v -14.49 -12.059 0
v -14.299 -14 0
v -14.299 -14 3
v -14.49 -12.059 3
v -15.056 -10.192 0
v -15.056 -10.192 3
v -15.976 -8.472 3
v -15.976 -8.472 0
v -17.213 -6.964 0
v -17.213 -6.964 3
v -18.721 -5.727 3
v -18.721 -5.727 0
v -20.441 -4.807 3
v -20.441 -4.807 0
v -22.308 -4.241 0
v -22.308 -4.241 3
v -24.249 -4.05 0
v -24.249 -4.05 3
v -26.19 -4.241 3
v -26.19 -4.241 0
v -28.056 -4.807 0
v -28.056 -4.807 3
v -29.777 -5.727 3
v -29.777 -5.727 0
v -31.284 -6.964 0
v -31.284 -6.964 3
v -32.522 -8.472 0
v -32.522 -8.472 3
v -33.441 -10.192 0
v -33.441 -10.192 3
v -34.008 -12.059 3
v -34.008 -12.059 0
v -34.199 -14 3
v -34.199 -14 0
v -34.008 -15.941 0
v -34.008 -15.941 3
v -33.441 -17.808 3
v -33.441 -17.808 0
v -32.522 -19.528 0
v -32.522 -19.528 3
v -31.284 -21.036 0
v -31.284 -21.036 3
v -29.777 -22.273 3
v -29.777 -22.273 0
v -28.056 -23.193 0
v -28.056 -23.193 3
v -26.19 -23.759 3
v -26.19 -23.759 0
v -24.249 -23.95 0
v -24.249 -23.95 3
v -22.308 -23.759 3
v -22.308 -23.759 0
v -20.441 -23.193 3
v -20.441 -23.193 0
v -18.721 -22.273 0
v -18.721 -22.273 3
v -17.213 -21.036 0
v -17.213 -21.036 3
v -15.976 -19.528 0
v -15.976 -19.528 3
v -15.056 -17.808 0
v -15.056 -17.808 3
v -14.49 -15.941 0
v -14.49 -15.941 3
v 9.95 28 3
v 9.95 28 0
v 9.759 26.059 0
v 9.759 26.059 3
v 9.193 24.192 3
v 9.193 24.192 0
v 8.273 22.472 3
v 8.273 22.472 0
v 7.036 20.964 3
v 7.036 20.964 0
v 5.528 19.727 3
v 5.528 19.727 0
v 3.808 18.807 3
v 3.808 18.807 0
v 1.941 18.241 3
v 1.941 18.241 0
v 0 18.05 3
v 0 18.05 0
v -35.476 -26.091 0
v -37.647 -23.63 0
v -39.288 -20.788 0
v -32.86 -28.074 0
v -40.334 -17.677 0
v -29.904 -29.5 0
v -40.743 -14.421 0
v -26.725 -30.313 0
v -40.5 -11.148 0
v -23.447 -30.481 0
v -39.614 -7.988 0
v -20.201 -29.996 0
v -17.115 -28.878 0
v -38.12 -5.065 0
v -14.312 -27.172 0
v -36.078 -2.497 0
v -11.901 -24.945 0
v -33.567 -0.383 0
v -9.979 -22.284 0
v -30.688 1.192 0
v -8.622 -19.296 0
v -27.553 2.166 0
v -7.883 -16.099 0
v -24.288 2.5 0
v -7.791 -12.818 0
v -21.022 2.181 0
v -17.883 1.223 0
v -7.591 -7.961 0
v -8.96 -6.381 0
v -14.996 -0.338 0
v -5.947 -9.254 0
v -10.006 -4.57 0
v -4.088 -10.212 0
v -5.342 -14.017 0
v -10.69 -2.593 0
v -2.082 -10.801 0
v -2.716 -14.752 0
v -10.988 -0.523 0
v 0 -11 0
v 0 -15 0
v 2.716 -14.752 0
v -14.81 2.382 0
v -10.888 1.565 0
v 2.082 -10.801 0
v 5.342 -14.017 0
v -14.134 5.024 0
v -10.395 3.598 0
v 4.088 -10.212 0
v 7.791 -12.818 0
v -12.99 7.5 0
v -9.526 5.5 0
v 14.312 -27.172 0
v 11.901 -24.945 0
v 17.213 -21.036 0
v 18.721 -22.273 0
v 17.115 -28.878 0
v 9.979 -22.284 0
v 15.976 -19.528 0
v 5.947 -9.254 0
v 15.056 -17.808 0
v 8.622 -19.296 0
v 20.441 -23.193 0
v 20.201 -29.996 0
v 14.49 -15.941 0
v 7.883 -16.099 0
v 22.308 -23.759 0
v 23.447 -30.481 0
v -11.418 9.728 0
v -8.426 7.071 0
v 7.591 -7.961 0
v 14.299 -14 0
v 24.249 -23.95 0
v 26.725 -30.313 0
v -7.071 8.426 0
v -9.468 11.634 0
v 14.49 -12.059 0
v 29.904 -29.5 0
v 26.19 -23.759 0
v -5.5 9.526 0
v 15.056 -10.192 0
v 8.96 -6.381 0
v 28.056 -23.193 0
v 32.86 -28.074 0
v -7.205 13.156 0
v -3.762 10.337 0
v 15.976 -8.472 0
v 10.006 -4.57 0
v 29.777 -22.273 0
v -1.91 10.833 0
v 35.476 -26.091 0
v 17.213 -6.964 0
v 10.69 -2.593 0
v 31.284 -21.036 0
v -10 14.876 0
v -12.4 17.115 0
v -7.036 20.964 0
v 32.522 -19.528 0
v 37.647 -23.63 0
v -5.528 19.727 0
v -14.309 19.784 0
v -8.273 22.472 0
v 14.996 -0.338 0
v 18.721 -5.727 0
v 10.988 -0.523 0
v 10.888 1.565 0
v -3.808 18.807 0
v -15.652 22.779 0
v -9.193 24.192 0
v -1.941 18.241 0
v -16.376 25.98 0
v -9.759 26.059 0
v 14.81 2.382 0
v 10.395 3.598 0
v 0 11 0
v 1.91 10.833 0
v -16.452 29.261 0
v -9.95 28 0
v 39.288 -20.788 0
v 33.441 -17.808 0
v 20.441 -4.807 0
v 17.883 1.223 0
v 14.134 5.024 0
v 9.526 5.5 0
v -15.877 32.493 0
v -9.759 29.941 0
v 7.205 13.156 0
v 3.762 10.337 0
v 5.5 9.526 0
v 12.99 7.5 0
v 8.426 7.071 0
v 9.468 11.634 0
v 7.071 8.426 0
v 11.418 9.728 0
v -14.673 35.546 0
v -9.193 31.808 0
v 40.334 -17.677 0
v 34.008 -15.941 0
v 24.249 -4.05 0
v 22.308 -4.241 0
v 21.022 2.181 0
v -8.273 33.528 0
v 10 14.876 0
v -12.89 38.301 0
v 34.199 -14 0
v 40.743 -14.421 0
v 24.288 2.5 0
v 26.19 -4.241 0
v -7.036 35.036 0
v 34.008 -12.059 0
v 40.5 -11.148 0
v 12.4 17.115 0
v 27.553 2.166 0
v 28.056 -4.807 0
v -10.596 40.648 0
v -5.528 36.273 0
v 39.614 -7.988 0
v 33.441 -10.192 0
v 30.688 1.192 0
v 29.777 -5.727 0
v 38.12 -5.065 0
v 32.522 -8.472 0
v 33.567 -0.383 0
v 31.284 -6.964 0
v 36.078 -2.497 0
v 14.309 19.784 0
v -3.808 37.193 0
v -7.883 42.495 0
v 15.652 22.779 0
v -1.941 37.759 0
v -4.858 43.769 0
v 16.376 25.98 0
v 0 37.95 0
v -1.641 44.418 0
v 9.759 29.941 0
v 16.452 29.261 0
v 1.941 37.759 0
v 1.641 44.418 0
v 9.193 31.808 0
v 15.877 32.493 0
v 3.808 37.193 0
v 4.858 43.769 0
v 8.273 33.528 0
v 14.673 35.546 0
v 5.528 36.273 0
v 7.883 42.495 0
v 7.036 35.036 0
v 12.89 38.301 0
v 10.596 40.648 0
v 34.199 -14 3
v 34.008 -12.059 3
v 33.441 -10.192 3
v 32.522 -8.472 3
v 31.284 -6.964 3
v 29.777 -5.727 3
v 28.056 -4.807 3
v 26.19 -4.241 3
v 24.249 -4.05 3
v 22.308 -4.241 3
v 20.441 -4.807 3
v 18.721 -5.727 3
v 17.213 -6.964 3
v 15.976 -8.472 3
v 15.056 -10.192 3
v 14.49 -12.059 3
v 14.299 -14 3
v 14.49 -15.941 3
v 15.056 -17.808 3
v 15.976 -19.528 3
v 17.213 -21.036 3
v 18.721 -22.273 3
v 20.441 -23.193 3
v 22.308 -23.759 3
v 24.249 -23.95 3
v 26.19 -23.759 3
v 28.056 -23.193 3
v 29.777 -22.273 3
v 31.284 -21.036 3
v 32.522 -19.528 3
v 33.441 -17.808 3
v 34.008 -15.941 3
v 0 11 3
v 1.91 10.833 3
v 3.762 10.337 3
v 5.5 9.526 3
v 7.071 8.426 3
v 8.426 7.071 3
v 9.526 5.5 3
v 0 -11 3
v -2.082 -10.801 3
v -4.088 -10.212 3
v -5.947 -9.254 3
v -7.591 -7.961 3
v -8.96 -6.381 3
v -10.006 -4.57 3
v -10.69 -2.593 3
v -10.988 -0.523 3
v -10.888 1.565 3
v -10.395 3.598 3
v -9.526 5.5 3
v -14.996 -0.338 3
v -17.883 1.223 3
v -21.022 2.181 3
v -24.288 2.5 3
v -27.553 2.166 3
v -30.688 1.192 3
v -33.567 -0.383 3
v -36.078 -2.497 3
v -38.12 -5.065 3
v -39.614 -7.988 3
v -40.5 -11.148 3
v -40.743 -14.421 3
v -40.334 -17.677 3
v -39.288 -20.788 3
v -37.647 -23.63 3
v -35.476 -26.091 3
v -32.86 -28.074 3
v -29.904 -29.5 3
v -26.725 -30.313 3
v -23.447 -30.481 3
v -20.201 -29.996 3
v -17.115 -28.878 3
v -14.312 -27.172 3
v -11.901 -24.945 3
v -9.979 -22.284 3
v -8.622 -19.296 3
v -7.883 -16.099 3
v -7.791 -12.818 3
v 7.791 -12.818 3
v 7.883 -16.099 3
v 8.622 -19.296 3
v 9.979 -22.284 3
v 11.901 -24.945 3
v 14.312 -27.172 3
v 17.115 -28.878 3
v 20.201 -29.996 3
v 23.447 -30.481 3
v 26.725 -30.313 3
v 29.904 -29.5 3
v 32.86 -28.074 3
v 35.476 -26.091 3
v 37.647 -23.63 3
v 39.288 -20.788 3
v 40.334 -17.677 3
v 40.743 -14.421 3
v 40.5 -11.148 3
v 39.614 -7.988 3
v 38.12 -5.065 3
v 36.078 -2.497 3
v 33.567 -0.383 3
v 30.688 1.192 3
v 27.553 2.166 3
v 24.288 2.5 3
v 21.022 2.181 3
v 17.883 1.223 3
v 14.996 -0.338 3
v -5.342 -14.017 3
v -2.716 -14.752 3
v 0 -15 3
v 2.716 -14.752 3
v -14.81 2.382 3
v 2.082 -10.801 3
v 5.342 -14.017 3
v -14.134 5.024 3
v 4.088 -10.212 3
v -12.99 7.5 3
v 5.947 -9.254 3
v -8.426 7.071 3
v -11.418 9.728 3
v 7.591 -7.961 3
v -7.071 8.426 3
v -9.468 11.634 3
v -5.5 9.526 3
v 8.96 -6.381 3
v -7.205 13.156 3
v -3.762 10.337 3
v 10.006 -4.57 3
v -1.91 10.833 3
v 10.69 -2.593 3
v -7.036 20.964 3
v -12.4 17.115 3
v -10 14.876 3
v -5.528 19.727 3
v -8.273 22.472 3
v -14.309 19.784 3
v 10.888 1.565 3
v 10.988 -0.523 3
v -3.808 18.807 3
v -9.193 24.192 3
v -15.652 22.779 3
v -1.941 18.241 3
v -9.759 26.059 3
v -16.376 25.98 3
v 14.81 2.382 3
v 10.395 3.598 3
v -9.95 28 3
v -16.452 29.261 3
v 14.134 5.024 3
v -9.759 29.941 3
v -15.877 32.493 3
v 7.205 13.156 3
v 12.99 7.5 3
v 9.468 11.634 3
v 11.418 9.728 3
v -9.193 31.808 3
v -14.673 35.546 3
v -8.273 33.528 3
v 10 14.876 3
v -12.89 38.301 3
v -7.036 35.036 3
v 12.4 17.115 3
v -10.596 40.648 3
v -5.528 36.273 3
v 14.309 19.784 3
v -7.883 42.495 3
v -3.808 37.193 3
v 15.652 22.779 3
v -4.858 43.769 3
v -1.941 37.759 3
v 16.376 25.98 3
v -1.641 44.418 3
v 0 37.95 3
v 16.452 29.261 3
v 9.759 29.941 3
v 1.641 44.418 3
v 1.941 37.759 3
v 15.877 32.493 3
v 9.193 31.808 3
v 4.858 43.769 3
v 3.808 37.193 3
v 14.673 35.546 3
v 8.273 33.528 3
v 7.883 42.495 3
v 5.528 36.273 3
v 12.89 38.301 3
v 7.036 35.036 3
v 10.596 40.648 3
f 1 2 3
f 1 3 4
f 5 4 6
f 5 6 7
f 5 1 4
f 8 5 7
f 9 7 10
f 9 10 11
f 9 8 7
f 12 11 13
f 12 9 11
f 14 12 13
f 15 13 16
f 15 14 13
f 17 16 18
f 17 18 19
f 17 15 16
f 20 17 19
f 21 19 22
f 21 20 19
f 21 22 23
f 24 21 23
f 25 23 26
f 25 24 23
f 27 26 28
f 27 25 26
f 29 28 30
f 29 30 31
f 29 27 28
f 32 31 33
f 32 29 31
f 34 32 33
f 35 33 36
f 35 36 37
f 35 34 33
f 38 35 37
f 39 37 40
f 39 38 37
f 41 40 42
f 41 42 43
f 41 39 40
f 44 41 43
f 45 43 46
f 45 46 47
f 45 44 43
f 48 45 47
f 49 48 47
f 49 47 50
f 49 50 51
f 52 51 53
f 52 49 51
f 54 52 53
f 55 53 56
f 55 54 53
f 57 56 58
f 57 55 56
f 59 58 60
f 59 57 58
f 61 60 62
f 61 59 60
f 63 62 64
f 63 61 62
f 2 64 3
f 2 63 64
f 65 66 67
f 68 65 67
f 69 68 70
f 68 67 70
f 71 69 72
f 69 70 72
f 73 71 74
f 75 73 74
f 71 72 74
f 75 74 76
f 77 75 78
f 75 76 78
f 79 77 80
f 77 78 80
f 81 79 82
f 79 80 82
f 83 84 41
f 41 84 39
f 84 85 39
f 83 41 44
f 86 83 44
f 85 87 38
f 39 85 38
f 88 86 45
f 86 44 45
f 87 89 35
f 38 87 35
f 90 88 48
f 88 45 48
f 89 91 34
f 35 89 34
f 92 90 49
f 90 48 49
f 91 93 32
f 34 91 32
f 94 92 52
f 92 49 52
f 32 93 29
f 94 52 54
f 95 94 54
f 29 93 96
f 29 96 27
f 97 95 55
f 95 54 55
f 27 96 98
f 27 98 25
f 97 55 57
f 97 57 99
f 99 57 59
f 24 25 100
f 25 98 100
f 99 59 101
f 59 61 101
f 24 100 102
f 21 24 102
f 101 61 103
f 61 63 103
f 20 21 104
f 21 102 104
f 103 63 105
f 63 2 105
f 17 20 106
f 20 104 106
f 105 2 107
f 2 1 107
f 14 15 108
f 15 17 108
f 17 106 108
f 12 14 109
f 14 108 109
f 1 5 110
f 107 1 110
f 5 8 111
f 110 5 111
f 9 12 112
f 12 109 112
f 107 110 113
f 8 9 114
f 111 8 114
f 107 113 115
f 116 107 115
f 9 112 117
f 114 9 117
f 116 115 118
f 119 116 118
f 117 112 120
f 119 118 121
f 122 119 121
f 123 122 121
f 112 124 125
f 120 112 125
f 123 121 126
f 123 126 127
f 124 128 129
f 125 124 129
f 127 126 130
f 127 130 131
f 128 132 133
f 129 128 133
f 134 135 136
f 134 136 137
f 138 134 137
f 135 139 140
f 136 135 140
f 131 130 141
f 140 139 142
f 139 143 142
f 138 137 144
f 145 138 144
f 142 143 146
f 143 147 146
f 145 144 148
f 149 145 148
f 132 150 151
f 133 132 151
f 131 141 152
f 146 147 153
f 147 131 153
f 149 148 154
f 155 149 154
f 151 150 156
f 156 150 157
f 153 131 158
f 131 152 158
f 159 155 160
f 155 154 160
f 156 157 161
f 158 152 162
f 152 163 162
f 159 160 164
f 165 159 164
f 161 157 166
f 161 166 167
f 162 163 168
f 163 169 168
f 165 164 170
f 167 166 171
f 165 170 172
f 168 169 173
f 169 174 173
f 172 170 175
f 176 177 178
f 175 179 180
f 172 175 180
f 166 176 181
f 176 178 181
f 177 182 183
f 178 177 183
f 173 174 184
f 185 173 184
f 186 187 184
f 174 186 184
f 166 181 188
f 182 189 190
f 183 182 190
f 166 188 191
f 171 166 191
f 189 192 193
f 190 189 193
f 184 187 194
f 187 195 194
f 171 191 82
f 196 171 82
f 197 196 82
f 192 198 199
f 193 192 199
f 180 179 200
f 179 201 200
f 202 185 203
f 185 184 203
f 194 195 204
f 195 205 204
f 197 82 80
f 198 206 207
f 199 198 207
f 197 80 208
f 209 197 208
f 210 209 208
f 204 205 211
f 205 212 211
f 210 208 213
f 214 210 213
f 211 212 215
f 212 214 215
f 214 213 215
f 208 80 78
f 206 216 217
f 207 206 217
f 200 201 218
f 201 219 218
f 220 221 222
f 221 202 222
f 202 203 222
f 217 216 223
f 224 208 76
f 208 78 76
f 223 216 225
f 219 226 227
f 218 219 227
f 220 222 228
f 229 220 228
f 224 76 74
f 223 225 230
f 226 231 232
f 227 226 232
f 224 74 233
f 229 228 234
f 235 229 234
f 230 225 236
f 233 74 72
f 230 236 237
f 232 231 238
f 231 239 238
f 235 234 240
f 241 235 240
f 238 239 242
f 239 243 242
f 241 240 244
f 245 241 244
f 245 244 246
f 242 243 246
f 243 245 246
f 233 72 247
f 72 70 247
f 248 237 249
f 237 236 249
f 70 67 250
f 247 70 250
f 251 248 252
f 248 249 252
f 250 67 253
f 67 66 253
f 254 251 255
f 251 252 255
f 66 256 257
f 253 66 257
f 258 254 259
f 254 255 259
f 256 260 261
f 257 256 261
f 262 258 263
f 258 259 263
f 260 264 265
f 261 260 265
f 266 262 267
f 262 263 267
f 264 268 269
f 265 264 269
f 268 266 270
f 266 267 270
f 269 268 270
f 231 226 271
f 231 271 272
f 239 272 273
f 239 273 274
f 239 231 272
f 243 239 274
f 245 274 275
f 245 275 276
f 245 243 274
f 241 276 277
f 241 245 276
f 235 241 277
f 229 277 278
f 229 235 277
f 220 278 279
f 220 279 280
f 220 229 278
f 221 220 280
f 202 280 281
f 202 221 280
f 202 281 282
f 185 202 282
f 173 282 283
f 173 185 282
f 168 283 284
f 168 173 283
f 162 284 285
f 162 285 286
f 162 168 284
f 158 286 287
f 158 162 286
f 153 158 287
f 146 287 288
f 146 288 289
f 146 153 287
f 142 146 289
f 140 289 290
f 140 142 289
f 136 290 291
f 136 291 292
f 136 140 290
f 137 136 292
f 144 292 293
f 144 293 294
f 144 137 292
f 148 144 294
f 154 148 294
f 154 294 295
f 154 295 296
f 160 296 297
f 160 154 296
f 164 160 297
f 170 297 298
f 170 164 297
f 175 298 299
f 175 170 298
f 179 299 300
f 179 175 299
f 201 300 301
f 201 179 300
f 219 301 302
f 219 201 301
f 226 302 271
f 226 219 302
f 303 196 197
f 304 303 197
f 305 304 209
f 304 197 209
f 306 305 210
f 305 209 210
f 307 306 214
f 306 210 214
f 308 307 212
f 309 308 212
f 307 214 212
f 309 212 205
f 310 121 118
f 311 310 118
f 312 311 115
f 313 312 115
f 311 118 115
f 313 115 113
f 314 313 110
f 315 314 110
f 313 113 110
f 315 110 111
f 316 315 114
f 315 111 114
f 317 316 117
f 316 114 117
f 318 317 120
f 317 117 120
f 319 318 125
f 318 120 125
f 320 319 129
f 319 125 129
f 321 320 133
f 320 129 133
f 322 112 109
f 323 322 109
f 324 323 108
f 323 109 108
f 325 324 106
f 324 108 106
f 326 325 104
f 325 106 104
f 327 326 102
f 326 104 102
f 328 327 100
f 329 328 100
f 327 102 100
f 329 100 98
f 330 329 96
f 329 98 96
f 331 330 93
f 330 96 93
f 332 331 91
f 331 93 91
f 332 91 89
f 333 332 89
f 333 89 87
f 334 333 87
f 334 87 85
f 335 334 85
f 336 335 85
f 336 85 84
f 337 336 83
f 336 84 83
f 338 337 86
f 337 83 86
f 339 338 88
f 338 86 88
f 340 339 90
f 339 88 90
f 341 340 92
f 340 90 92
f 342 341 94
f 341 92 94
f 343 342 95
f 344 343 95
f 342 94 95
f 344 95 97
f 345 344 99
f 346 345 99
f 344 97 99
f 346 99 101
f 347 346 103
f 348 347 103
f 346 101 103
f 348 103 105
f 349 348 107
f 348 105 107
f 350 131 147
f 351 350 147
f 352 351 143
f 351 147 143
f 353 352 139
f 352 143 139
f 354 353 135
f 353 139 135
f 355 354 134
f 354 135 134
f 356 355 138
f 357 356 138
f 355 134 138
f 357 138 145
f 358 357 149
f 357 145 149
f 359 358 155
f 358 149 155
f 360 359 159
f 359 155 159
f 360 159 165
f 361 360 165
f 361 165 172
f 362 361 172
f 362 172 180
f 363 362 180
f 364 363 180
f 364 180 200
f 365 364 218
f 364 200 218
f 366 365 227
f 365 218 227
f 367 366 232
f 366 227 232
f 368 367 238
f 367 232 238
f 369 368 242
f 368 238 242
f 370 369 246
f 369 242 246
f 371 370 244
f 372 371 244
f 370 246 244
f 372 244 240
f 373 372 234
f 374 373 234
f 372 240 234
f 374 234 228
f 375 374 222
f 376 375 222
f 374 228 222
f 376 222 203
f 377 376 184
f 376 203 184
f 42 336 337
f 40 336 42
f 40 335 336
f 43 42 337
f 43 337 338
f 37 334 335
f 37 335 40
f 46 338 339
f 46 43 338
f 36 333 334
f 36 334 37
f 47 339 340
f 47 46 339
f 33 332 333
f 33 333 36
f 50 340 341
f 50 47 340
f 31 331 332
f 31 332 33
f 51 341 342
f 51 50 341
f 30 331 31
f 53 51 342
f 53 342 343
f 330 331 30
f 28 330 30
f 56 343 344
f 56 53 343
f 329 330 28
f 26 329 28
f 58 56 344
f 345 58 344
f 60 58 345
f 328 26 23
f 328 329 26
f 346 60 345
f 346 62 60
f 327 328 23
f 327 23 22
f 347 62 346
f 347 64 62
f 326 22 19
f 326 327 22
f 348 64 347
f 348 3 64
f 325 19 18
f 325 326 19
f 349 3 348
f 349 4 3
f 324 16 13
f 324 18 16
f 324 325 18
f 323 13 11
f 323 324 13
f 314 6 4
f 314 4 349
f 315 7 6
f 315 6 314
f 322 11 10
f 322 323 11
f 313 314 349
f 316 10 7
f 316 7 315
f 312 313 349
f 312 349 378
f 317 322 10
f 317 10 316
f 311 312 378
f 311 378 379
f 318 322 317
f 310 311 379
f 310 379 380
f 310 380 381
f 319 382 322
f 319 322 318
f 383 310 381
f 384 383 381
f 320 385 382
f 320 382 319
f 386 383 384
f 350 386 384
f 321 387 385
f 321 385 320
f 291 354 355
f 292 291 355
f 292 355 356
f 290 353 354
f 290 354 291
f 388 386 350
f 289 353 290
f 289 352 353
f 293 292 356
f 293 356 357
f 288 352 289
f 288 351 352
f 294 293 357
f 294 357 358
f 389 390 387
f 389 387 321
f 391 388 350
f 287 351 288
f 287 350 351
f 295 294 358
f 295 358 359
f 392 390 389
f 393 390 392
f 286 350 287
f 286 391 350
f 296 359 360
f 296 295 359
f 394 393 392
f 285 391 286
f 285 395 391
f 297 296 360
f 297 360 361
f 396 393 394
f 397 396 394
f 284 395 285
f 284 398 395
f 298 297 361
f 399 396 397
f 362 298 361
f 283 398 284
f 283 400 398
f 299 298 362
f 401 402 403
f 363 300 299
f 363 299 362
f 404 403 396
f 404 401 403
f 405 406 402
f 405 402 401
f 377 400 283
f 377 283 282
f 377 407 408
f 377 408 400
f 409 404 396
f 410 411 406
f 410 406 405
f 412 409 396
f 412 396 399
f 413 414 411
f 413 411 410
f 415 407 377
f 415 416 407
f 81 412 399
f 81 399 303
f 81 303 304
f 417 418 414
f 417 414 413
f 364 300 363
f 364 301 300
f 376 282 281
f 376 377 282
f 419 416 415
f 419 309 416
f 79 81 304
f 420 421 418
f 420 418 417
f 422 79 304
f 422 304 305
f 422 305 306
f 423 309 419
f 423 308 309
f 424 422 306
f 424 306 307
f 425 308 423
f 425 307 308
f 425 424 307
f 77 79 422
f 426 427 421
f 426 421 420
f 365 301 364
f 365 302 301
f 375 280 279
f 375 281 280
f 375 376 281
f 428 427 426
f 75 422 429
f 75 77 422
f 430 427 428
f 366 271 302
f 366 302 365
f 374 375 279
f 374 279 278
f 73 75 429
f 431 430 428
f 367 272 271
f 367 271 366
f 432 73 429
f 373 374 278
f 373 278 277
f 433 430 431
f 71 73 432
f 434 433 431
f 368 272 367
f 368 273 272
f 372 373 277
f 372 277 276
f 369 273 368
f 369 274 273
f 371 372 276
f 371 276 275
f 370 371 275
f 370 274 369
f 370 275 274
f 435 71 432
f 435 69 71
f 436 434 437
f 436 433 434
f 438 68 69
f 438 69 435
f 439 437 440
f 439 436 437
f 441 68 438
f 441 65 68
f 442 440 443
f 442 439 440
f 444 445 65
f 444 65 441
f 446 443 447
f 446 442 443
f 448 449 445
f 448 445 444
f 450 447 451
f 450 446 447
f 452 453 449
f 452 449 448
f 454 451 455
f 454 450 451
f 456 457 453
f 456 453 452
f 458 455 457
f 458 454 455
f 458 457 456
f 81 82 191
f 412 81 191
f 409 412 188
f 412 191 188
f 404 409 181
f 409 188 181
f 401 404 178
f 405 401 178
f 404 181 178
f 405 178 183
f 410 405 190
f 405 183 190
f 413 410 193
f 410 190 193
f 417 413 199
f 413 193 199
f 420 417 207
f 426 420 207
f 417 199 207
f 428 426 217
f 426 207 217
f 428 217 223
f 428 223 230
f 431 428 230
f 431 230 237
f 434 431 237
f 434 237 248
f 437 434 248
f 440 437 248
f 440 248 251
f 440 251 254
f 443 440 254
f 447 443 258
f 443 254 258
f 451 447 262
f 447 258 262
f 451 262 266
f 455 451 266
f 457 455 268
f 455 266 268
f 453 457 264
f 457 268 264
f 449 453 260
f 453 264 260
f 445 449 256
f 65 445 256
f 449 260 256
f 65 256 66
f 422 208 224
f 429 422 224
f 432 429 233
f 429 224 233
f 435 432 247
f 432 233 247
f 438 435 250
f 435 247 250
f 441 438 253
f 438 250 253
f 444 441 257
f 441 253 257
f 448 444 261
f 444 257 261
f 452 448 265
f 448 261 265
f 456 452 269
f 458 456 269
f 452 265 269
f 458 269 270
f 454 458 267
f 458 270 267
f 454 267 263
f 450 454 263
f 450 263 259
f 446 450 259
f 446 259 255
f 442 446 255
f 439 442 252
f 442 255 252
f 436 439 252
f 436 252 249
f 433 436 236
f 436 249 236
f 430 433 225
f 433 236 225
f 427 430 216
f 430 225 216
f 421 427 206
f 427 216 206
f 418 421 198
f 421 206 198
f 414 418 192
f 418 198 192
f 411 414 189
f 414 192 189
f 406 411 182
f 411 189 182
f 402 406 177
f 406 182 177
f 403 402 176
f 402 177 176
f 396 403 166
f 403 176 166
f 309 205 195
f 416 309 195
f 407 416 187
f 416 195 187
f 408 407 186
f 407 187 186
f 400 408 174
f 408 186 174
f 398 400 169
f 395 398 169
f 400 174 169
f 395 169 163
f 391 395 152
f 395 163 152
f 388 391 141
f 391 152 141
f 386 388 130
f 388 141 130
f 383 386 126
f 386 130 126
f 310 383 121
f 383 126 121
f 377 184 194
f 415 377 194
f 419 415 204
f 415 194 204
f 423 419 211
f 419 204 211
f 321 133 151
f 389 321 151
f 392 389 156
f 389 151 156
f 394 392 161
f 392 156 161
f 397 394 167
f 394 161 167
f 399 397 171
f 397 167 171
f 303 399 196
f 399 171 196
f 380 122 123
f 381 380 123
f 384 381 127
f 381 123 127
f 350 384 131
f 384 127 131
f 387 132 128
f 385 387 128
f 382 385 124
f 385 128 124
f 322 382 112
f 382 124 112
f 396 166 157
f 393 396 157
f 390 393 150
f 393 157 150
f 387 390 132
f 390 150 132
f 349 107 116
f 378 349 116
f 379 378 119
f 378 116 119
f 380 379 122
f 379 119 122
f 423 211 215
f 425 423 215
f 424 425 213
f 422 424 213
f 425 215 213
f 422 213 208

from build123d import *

# Parameters (mm, degrees)
F0_R     = 9.95
F1_DEPTH = 3


with BuildPart() as f1:
    # F0 (on Top) → F1 (new body)
    with BuildSketch(Plane.XY):
        with BuildLine():
            ThreePointArc((7.205074, 13.15625), (0, 44.5), (-7.205074, 13.15625))
            ThreePointArc((-7.205074, 13.15625), (-10.486295, 10.725559), (-12.990381, 7.5))
            ThreePointArc((-12.990381, 7.5), (-14.531754, 3.718619), (-14.996184, -0.338348))
            ThreePointArc((-14.996184, -0.338348), (-38.53813, -22.25), (-7.79111, -12.817902))
            ThreePointArc((-7.79111, -12.817902), (-4.045459, -14.444177), (0, -15))
            ThreePointArc((0, -15), (4.045459, -14.444177), (7.79111, -12.817902))
            ThreePointArc((7.79111, -12.817902), (38.53813, -22.25), (14.996184, -0.338348))
            ThreePointArc((14.996184, -0.338348), (14.531754, 3.718619), (12.990381, 7.5))
            ThreePointArc((12.990381, 7.5), (10.486295, 10.725559), (7.205074, 13.15625))
        make_face()
        with Locations((-24.248711, -14)):
            Circle(F0_R, mode=Mode.SUBTRACT)
        with BuildLine():
            ThreePointArc((0, 11), (5.5, 9.526279), (9.526279, 5.5))
            ThreePointArc((9.526279, 5.5), (9.526279, -5.5), (0, -11))
            ThreePointArc((0, -11), (-9.526279, -5.5), (-9.526279, 5.5))
            ThreePointArc((-9.526279, 5.5), (-5.5, 9.526279), (0, 11))
        make_face(mode=Mode.SUBTRACT)
        with Locations((24.248711, -14)):
            Circle(F0_R, mode=Mode.SUBTRACT)
        with BuildLine():
            ThreePointArc((9.95, 28), (7.035712, 20.964288), (0, 18.05))
            ThreePointArc((0, 18.05), (-7.035712, 35.035712), (9.95, 28))
        make_face(mode=Mode.SUBTRACT)
    extrude(amount=F1_DEPTH)


solid = f1.part
